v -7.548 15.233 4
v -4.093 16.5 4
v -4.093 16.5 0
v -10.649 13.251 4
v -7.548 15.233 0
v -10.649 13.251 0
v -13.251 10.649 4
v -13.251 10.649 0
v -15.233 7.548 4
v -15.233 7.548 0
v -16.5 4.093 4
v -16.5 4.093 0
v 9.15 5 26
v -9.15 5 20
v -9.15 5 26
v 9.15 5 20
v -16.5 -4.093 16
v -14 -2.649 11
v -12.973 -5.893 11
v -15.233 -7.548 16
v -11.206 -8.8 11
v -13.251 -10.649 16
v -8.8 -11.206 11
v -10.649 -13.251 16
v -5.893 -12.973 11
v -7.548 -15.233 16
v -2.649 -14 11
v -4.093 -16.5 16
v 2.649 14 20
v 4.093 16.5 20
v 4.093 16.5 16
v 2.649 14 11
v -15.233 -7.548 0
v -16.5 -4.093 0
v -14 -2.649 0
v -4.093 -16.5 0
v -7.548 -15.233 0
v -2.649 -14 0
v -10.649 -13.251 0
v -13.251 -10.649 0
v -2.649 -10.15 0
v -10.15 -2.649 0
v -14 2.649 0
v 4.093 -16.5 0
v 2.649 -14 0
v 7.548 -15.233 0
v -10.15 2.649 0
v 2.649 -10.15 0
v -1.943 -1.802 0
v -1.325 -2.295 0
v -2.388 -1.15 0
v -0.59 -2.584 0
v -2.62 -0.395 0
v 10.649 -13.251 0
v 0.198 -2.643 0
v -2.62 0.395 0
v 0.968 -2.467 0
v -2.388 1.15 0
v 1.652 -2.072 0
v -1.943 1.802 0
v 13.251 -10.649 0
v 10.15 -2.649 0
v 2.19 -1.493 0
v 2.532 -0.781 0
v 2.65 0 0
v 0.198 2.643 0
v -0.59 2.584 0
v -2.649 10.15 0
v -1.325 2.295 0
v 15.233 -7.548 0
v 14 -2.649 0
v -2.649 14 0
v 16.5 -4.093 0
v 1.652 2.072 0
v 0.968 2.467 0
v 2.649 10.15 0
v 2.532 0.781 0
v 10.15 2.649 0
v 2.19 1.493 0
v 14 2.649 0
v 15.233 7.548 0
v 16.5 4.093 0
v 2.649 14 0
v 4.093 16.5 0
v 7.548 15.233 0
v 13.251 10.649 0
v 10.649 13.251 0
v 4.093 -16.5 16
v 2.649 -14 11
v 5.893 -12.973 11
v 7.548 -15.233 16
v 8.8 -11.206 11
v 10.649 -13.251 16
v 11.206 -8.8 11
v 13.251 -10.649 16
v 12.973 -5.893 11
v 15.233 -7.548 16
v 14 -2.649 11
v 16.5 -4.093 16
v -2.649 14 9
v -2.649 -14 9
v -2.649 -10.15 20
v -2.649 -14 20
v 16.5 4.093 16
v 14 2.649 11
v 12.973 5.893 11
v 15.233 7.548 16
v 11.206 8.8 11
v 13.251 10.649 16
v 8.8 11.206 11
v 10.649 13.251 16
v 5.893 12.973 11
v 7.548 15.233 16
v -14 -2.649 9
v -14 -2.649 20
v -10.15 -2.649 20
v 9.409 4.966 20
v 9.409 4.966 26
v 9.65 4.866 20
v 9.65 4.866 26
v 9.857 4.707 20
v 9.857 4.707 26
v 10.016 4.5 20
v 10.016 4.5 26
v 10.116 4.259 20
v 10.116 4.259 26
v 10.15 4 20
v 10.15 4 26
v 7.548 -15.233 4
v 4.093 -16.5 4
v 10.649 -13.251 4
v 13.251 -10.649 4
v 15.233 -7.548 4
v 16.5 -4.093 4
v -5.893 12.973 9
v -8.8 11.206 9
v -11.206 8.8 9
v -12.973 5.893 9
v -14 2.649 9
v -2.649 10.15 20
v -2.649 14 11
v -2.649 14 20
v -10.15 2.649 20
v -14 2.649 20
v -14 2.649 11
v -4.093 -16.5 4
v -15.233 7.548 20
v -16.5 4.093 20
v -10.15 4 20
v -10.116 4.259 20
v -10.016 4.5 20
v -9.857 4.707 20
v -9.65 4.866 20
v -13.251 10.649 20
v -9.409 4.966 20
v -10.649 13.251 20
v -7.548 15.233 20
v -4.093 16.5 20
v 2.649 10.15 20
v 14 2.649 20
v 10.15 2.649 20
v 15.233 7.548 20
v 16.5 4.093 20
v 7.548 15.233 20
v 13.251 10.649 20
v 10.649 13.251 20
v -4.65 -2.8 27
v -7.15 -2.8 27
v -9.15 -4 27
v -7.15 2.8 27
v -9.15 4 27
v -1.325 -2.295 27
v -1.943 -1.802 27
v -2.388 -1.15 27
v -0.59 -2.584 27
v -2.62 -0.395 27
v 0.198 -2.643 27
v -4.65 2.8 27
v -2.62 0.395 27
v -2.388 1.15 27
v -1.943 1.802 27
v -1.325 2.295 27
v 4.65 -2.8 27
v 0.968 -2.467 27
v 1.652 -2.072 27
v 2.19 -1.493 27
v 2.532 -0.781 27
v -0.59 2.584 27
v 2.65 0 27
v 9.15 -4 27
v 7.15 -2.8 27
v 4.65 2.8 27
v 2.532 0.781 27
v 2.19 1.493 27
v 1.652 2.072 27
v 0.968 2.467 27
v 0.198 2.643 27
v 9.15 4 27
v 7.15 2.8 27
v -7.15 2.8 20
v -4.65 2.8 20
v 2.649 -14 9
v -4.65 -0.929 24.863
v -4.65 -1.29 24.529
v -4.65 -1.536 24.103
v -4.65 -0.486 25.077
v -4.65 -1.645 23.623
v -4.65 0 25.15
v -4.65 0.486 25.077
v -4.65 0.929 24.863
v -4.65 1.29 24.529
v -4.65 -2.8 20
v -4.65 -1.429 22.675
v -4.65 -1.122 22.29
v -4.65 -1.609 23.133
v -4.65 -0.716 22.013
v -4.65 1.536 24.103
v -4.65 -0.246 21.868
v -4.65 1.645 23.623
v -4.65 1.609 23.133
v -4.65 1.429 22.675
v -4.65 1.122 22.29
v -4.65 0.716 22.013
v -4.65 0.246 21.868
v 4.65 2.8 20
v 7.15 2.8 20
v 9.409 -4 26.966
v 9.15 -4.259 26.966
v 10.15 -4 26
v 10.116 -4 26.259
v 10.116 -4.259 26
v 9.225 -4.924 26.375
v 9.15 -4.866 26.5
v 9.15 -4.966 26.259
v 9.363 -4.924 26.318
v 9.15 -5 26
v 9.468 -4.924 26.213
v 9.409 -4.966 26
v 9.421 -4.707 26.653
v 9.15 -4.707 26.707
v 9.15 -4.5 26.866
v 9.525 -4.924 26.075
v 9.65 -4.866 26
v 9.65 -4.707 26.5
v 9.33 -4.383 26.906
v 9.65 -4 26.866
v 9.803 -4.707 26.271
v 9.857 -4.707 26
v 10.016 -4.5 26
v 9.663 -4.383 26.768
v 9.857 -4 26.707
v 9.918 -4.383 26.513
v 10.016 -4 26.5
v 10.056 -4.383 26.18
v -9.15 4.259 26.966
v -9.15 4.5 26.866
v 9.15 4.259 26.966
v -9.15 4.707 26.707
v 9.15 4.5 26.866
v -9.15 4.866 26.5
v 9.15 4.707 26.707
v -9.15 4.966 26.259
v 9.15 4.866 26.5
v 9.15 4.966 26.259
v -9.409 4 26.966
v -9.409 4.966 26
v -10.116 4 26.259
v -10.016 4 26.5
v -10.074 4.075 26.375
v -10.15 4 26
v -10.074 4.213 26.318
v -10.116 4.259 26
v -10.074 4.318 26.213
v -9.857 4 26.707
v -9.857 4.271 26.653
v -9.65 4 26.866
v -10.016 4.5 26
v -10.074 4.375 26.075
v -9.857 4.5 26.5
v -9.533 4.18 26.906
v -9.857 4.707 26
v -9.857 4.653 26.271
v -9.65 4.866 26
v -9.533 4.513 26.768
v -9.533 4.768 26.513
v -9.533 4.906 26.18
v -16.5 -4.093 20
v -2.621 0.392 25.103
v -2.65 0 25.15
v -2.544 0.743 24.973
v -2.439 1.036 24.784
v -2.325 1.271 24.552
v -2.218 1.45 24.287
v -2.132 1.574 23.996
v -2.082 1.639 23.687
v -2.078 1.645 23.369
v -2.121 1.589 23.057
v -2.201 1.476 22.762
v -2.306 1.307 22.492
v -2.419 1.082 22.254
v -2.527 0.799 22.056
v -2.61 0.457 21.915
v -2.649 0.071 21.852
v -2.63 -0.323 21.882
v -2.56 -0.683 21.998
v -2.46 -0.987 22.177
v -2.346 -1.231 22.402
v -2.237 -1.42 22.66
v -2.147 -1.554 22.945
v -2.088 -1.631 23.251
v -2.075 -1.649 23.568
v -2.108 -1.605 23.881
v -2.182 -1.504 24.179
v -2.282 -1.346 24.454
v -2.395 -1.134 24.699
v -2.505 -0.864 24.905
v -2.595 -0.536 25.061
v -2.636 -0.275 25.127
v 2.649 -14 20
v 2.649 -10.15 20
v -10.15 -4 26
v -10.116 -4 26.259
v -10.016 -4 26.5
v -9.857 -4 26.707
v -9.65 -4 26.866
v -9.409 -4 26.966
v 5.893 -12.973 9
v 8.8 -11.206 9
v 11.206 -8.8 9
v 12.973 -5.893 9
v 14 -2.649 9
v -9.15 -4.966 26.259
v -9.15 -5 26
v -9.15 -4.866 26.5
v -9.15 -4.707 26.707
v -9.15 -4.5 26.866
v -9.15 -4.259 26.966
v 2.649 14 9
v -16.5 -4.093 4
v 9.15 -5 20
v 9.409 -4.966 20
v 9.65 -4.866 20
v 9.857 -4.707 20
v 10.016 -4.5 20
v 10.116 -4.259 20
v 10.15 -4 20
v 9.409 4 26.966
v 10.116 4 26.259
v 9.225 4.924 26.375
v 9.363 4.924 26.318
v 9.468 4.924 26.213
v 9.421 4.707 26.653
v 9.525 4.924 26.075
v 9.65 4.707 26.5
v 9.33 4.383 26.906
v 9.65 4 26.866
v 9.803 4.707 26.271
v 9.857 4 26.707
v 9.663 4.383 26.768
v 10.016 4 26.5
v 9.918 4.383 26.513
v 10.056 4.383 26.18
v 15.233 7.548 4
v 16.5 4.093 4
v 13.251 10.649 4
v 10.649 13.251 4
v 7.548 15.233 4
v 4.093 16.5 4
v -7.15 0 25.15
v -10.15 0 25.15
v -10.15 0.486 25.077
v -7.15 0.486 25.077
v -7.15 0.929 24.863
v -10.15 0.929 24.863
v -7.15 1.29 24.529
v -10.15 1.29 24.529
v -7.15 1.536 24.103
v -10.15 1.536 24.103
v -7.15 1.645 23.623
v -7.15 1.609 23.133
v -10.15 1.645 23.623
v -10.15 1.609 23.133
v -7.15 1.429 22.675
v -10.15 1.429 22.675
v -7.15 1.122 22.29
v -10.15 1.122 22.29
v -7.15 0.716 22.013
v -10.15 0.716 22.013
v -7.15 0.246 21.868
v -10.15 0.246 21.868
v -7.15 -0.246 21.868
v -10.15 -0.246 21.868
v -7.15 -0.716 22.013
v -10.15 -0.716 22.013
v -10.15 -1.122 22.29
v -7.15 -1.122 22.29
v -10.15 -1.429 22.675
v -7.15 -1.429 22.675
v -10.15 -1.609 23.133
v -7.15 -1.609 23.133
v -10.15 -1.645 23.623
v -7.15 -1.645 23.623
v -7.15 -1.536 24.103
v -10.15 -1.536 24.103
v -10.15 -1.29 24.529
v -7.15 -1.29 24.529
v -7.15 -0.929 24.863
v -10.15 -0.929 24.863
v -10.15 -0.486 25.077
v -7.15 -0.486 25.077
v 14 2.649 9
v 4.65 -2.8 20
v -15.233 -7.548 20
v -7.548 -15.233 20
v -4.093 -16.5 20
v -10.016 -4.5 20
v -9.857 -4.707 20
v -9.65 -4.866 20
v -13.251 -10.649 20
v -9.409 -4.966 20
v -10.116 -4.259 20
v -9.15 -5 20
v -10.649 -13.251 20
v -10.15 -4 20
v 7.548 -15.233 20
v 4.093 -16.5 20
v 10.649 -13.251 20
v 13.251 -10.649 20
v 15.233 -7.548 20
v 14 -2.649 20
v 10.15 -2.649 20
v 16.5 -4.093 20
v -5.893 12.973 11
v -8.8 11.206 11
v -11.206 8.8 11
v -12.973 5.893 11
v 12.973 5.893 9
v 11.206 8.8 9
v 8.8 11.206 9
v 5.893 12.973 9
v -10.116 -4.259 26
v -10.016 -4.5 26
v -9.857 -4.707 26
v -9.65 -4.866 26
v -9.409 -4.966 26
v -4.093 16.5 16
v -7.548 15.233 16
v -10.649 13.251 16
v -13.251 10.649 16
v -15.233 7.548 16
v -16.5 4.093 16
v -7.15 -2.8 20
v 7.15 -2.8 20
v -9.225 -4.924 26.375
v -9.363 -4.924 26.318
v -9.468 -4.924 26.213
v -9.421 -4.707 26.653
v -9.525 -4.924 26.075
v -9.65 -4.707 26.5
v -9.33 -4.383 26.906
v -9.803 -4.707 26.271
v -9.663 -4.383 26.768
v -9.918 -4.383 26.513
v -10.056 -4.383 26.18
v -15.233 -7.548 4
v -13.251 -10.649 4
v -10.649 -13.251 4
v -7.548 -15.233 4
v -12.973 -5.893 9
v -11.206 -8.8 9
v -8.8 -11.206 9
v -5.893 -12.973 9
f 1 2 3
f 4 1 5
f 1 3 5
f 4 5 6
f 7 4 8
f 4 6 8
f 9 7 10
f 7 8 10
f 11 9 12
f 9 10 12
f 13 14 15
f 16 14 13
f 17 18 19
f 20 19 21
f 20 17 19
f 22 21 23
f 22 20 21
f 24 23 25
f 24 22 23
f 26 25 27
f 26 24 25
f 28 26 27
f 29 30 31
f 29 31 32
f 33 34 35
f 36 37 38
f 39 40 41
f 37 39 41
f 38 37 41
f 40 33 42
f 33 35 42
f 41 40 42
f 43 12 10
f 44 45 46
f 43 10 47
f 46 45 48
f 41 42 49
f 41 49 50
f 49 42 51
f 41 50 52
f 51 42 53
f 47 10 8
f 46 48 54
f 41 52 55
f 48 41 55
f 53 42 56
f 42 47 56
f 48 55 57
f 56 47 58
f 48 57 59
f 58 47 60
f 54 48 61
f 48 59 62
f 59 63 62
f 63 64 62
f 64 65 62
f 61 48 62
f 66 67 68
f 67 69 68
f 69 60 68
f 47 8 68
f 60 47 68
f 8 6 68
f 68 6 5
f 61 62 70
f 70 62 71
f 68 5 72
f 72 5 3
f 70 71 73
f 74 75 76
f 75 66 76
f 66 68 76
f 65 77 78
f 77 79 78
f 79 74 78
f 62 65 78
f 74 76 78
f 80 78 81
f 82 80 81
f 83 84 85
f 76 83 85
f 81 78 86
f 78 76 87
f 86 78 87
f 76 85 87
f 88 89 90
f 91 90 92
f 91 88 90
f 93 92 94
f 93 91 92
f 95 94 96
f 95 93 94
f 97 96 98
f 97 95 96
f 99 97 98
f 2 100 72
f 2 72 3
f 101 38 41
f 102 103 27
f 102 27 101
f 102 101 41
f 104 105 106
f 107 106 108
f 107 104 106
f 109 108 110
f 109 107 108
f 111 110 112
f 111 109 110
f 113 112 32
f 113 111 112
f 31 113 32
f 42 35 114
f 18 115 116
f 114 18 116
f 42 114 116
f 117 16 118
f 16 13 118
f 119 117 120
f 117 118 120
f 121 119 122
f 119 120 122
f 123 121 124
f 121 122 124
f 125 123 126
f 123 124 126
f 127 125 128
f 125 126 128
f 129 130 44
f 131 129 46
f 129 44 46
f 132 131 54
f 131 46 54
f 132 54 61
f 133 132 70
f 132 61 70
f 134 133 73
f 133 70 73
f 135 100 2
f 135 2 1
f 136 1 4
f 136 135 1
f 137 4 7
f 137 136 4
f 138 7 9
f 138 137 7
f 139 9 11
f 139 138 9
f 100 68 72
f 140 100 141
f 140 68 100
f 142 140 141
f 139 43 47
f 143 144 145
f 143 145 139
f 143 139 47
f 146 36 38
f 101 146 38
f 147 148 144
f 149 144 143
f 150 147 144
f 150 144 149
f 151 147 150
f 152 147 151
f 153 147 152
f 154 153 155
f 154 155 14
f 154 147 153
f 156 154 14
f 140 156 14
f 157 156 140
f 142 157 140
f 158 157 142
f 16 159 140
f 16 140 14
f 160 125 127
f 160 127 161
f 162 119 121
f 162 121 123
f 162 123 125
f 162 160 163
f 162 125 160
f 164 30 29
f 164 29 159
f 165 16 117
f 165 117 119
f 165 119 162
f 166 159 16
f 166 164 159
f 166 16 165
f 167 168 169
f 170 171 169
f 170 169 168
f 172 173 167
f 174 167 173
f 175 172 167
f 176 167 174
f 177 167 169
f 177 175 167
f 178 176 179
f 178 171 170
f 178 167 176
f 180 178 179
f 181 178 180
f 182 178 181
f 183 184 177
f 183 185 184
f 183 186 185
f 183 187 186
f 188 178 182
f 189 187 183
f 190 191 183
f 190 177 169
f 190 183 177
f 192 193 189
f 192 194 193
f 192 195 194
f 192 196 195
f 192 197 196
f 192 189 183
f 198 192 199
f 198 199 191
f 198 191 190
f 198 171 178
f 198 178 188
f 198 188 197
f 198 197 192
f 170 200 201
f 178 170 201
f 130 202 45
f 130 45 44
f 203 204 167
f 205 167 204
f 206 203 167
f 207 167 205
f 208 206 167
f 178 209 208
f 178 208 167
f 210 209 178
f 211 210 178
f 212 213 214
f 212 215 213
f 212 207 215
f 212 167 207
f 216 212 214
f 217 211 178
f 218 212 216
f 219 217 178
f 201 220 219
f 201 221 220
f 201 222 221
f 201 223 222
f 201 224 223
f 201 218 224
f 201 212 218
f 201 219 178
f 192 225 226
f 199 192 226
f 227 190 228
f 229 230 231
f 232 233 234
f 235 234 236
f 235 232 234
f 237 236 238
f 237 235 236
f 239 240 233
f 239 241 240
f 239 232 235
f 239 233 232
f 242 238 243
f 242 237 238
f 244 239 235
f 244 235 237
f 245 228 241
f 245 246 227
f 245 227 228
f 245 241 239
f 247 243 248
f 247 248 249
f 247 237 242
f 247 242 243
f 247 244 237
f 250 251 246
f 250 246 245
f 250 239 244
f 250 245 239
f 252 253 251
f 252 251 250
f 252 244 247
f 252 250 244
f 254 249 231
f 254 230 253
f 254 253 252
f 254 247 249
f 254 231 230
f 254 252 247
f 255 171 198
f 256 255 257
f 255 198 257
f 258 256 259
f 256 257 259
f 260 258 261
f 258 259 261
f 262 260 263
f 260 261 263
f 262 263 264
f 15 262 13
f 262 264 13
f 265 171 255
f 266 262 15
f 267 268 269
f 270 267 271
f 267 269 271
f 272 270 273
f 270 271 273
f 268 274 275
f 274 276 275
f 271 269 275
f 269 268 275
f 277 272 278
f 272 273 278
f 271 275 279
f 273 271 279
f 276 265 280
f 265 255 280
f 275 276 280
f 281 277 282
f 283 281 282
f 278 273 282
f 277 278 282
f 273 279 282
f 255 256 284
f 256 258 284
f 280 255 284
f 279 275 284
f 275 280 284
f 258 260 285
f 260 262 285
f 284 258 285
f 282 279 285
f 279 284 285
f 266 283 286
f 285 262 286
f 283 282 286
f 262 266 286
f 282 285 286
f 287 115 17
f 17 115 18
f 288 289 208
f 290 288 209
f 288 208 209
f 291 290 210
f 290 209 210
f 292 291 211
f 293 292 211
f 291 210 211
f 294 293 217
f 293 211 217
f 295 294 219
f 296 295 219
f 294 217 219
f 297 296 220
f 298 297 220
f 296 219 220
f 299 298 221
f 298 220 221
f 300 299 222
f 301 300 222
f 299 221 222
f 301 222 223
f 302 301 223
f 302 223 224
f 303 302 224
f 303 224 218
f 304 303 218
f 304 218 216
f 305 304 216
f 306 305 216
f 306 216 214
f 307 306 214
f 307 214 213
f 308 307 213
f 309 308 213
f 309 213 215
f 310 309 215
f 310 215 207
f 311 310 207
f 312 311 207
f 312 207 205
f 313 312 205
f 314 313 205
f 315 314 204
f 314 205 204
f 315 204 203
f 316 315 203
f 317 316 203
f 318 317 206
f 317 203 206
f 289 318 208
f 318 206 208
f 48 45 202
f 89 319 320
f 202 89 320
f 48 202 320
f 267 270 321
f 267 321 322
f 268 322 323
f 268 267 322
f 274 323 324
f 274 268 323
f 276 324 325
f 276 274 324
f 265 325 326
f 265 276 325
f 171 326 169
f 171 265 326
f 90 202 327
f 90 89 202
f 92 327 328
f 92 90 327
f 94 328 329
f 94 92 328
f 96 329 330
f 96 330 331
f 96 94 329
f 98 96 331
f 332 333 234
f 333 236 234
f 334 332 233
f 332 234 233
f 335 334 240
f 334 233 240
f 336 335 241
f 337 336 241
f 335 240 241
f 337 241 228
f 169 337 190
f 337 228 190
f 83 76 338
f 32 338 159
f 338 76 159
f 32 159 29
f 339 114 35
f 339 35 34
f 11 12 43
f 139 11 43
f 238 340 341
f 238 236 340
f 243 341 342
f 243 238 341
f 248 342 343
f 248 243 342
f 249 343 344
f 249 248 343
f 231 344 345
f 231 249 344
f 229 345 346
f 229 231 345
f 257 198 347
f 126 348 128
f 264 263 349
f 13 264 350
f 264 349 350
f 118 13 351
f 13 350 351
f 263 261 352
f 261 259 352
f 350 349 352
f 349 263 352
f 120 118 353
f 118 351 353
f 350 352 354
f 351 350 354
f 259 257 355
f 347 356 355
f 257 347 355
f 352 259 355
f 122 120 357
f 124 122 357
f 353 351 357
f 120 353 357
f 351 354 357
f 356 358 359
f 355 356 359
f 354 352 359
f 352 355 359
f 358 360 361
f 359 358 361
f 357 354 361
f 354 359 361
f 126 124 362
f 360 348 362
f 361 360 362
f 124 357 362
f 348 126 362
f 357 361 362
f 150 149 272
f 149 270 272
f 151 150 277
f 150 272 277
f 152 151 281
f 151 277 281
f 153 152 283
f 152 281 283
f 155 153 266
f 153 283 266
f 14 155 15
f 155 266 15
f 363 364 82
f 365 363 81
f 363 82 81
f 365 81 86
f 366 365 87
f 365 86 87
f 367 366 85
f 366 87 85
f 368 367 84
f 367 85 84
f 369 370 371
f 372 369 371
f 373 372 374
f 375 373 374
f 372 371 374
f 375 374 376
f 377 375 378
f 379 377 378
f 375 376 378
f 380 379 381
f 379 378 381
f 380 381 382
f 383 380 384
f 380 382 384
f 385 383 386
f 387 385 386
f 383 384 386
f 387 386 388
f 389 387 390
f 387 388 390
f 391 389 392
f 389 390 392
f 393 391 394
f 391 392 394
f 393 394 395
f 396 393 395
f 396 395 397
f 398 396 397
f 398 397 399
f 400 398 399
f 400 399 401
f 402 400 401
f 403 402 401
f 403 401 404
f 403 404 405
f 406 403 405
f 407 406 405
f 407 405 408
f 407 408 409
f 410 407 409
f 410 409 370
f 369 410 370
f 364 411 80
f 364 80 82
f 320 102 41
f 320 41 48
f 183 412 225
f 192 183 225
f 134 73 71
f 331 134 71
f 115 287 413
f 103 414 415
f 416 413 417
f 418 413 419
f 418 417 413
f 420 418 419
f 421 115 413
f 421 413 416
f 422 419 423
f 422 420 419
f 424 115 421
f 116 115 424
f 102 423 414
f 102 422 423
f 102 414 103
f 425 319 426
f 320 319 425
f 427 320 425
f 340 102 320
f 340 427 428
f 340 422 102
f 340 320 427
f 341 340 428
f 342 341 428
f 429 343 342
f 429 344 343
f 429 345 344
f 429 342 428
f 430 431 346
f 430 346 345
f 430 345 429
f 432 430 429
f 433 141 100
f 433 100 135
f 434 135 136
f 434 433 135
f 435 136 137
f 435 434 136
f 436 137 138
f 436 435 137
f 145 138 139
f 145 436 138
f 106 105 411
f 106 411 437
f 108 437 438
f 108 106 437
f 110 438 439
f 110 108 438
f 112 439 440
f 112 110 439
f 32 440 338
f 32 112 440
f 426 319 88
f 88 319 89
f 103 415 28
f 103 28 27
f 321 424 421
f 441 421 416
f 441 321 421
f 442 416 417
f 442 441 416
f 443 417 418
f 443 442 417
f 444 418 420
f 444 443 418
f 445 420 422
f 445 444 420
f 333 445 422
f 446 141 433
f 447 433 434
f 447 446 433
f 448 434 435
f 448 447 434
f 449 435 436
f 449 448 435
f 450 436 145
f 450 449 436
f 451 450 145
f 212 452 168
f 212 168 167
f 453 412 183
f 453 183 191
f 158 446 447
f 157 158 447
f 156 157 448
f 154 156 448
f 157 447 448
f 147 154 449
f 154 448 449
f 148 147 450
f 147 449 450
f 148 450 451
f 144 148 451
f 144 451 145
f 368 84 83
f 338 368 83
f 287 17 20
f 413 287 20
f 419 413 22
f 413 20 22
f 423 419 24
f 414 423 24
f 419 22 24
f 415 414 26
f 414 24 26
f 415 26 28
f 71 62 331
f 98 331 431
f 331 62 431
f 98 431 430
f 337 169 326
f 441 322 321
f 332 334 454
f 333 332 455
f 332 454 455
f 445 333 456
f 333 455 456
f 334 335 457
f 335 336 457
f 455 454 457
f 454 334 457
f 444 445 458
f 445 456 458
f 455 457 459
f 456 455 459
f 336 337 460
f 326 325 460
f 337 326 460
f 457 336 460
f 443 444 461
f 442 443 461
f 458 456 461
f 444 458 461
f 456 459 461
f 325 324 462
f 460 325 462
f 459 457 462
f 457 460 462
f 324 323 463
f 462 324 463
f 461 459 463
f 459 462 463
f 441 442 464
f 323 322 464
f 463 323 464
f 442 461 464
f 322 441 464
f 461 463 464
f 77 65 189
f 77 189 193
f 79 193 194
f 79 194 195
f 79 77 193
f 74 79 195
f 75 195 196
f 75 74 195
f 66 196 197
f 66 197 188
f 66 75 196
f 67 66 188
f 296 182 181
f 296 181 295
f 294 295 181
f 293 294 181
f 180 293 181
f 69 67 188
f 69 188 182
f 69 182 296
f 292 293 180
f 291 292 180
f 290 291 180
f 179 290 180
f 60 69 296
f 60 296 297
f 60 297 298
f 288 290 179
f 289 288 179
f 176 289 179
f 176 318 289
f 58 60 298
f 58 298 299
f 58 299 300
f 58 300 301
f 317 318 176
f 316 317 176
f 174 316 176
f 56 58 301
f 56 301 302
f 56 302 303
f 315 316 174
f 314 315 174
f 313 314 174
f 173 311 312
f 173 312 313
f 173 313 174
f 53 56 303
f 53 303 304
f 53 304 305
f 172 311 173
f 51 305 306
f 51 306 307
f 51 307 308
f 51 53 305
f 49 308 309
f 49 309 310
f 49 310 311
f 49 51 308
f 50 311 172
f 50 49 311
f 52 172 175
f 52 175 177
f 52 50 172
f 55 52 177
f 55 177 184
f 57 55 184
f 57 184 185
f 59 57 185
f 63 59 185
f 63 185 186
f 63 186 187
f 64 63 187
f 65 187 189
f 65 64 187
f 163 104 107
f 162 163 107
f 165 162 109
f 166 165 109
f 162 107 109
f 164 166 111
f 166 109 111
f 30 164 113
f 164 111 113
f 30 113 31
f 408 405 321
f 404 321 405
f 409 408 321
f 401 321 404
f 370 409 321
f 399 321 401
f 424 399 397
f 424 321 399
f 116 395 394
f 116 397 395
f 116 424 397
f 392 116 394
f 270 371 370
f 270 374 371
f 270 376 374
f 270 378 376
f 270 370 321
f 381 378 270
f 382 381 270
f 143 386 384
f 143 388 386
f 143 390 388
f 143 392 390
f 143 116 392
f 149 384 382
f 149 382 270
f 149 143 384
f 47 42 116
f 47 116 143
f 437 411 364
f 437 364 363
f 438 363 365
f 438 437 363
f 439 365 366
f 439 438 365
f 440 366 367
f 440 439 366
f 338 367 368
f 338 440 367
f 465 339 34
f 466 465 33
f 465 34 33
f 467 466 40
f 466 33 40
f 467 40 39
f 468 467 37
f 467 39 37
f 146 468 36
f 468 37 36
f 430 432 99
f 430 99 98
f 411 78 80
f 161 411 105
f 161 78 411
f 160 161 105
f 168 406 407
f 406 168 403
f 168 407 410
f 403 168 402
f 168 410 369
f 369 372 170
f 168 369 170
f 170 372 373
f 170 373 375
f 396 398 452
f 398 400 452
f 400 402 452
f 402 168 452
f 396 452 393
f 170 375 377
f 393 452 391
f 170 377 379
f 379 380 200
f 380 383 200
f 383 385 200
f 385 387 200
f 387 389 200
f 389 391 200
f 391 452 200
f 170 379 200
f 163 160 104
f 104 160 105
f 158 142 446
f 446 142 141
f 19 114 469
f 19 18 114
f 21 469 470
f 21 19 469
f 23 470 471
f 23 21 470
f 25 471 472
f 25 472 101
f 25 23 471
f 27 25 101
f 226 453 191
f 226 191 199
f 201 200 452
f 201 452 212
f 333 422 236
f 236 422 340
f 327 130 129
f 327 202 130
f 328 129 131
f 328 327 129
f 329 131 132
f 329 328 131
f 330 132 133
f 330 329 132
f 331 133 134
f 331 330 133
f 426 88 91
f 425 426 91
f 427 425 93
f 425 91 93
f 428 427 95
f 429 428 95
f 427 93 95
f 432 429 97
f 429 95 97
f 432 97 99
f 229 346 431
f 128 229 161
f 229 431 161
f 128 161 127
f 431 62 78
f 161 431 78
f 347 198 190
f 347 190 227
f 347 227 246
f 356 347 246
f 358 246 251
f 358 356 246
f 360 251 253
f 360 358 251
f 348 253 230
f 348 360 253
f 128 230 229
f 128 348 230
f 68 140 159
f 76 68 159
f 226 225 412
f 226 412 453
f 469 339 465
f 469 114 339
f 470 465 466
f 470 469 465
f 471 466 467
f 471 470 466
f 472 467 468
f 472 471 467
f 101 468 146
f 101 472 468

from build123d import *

# Parameters (mm, degrees)
SKETCH1_R           = 2.65
BOSS_EXTRUDE1_DEPTH = 20
SKETCH2_W           = 20.3
SKETCH2_H           = 10
SKETCH2_R           = 2.65
SKETCH2_W_2         = 2.5
SKETCH2_H_2         = 5.6
BOSS_EXTRUDE2_DEPTH = 7
SKETCH3_R           = 1.65
CUT_EXTRUDE5_DEPTH  = 10
FILLET1_R           = 1
SKETCH7_W           = 3.85
SKETCH7_H           = 5.298601426
SKETCH7_W_2         = 5.298601426
SKETCH7_H_2         = 3.85
CUT_EXTRUDE6_DEPTH  = 20


with BuildPart() as part:
    # Sketch1 → Boss-Extrude1 (new body)
    with BuildSketch(Plane.XY):
        with BuildLine():
            Line((4.092676386, 16.5), (2.649300713, 14))
            Line((2.649300713, 14), (-2.649300713, 14))
            Line((-2.649300713, 14), (-4.092676386, 16.5))
            ThreePointArc((-4.092676386, 16.5), (-12.02081528, 12.02081528), (-16.5, 4.092676386))
            Line((-16.5, 4.092676386), (-14, 2.649300713))
            Line((-14, 2.649300713), (-14, -2.649300713))
            Line((-14, -2.649300713), (-16.5, -4.092676386))
            ThreePointArc((-16.5, -4.092676386), (-12.02081528, -12.02081528), (-4.092676386, -16.5))
            Line((-4.092676386, -16.5), (-2.649300713, -14))
            Line((-2.649300713, -14), (2.649300713, -14))
            Line((2.649300713, -14), (4.092676386, -16.5))
            ThreePointArc((4.092676386, -16.5), (12.02081528, -12.02081528), (16.5, -4.092676386))
            Line((16.5, -4.092676386), (14, -2.649300713))
            Line((14, -2.649300713), (14, 2.649300713))
            Line((14, 2.649300713), (16.5, 4.092676386))
            ThreePointArc((16.5, 4.092676386), (12.02081528, 12.02081528), (4.092676386, 16.5))
        make_face()
        Circle(SKETCH1_R, mode=Mode.SUBTRACT)
    extrude(amount=BOSS_EXTRUDE1_DEPTH)

    # Sketch2 → Boss-Extrude2 (add)
    with BuildSketch(Plane.XY.offset(20)):
        Rectangle(SKETCH2_W, SKETCH2_H)
        Circle(SKETCH2_R, mode=Mode.SUBTRACT)
        with Locations((-5.9, 0)):
            Rectangle(SKETCH2_W_2, SKETCH2_H_2, mode=Mode.SUBTRACT)
        with Locations((5.9, 0)):
            Rectangle(SKETCH2_W_2, SKETCH2_H_2, mode=Mode.SUBTRACT)
    extrude(amount=BOSS_EXTRUDE2_DEPTH)

    # Sketch3 → Cut-Extrude5 (cut)
    with BuildSketch(Plane.ZY.offset(10.15)):
        with Locations((23.5, 0)):
            Circle(SKETCH3_R)
    extrude(amount=-CUT_EXTRUDE5_DEPTH, mode=Mode.SUBTRACT)

    # Fillet1
    fillet1_edges = [part.edges().sort_by_distance(p)[0] for p in [
        (10.15, 0, 27),
        (0, 5, 27),
        (-10.15, 0, 27),
        (0, -5, 27),
        (10.15, -5, 23.5),
        (10.15, 5, 23.5),
        (-10.15, 5, 23.5),
        (-10.15, -5, 23.5),
    ]]
    fillet(fillet1_edges, radius=FILLET1_R)

    # Cut-Sweep2: sweep along a path in Sketch6
    with BuildLine(Plane.XY.offset(20)) as cut_sweep2_path:
        CenterArc((0, 0), 17, 0, 360)
    # Sketch5 → Cut-Sweep2 (sweep, cut)
    with BuildSketch(Plane(origin=(-4.075202292, 2.35281914, 0), x_dir=(0, 0, 1), z_dir=(-0.8660254037844398, 0.499999999999998, 0))):
        Polygon((9, 13.449006009), (11, 13.449006009), (16, 16.335757355), (4, 16.335757355), align=None)
    sweep(path=cut_sweep2_path.line, mode=Mode.SUBTRACT)

    # Sketch7 → Cut-Extrude6 (cut)
    with BuildSketch(Plane.XY.offset(20)):
        with Locations((-12.075, 0)):
            Rectangle(SKETCH7_W, SKETCH7_H)
        with Locations((0, 12.075)):
            Rectangle(SKETCH7_W_2, SKETCH7_H_2)
        with Locations((12.075, 0)):
            Rectangle(SKETCH7_W, SKETCH7_H)
        with Locations((0, -12.075)):
            Rectangle(SKETCH7_W_2, SKETCH7_H_2)
    extrude(amount=-CUT_EXTRUDE6_DEPTH, mode=Mode.SUBTRACT)


solid = part.part
